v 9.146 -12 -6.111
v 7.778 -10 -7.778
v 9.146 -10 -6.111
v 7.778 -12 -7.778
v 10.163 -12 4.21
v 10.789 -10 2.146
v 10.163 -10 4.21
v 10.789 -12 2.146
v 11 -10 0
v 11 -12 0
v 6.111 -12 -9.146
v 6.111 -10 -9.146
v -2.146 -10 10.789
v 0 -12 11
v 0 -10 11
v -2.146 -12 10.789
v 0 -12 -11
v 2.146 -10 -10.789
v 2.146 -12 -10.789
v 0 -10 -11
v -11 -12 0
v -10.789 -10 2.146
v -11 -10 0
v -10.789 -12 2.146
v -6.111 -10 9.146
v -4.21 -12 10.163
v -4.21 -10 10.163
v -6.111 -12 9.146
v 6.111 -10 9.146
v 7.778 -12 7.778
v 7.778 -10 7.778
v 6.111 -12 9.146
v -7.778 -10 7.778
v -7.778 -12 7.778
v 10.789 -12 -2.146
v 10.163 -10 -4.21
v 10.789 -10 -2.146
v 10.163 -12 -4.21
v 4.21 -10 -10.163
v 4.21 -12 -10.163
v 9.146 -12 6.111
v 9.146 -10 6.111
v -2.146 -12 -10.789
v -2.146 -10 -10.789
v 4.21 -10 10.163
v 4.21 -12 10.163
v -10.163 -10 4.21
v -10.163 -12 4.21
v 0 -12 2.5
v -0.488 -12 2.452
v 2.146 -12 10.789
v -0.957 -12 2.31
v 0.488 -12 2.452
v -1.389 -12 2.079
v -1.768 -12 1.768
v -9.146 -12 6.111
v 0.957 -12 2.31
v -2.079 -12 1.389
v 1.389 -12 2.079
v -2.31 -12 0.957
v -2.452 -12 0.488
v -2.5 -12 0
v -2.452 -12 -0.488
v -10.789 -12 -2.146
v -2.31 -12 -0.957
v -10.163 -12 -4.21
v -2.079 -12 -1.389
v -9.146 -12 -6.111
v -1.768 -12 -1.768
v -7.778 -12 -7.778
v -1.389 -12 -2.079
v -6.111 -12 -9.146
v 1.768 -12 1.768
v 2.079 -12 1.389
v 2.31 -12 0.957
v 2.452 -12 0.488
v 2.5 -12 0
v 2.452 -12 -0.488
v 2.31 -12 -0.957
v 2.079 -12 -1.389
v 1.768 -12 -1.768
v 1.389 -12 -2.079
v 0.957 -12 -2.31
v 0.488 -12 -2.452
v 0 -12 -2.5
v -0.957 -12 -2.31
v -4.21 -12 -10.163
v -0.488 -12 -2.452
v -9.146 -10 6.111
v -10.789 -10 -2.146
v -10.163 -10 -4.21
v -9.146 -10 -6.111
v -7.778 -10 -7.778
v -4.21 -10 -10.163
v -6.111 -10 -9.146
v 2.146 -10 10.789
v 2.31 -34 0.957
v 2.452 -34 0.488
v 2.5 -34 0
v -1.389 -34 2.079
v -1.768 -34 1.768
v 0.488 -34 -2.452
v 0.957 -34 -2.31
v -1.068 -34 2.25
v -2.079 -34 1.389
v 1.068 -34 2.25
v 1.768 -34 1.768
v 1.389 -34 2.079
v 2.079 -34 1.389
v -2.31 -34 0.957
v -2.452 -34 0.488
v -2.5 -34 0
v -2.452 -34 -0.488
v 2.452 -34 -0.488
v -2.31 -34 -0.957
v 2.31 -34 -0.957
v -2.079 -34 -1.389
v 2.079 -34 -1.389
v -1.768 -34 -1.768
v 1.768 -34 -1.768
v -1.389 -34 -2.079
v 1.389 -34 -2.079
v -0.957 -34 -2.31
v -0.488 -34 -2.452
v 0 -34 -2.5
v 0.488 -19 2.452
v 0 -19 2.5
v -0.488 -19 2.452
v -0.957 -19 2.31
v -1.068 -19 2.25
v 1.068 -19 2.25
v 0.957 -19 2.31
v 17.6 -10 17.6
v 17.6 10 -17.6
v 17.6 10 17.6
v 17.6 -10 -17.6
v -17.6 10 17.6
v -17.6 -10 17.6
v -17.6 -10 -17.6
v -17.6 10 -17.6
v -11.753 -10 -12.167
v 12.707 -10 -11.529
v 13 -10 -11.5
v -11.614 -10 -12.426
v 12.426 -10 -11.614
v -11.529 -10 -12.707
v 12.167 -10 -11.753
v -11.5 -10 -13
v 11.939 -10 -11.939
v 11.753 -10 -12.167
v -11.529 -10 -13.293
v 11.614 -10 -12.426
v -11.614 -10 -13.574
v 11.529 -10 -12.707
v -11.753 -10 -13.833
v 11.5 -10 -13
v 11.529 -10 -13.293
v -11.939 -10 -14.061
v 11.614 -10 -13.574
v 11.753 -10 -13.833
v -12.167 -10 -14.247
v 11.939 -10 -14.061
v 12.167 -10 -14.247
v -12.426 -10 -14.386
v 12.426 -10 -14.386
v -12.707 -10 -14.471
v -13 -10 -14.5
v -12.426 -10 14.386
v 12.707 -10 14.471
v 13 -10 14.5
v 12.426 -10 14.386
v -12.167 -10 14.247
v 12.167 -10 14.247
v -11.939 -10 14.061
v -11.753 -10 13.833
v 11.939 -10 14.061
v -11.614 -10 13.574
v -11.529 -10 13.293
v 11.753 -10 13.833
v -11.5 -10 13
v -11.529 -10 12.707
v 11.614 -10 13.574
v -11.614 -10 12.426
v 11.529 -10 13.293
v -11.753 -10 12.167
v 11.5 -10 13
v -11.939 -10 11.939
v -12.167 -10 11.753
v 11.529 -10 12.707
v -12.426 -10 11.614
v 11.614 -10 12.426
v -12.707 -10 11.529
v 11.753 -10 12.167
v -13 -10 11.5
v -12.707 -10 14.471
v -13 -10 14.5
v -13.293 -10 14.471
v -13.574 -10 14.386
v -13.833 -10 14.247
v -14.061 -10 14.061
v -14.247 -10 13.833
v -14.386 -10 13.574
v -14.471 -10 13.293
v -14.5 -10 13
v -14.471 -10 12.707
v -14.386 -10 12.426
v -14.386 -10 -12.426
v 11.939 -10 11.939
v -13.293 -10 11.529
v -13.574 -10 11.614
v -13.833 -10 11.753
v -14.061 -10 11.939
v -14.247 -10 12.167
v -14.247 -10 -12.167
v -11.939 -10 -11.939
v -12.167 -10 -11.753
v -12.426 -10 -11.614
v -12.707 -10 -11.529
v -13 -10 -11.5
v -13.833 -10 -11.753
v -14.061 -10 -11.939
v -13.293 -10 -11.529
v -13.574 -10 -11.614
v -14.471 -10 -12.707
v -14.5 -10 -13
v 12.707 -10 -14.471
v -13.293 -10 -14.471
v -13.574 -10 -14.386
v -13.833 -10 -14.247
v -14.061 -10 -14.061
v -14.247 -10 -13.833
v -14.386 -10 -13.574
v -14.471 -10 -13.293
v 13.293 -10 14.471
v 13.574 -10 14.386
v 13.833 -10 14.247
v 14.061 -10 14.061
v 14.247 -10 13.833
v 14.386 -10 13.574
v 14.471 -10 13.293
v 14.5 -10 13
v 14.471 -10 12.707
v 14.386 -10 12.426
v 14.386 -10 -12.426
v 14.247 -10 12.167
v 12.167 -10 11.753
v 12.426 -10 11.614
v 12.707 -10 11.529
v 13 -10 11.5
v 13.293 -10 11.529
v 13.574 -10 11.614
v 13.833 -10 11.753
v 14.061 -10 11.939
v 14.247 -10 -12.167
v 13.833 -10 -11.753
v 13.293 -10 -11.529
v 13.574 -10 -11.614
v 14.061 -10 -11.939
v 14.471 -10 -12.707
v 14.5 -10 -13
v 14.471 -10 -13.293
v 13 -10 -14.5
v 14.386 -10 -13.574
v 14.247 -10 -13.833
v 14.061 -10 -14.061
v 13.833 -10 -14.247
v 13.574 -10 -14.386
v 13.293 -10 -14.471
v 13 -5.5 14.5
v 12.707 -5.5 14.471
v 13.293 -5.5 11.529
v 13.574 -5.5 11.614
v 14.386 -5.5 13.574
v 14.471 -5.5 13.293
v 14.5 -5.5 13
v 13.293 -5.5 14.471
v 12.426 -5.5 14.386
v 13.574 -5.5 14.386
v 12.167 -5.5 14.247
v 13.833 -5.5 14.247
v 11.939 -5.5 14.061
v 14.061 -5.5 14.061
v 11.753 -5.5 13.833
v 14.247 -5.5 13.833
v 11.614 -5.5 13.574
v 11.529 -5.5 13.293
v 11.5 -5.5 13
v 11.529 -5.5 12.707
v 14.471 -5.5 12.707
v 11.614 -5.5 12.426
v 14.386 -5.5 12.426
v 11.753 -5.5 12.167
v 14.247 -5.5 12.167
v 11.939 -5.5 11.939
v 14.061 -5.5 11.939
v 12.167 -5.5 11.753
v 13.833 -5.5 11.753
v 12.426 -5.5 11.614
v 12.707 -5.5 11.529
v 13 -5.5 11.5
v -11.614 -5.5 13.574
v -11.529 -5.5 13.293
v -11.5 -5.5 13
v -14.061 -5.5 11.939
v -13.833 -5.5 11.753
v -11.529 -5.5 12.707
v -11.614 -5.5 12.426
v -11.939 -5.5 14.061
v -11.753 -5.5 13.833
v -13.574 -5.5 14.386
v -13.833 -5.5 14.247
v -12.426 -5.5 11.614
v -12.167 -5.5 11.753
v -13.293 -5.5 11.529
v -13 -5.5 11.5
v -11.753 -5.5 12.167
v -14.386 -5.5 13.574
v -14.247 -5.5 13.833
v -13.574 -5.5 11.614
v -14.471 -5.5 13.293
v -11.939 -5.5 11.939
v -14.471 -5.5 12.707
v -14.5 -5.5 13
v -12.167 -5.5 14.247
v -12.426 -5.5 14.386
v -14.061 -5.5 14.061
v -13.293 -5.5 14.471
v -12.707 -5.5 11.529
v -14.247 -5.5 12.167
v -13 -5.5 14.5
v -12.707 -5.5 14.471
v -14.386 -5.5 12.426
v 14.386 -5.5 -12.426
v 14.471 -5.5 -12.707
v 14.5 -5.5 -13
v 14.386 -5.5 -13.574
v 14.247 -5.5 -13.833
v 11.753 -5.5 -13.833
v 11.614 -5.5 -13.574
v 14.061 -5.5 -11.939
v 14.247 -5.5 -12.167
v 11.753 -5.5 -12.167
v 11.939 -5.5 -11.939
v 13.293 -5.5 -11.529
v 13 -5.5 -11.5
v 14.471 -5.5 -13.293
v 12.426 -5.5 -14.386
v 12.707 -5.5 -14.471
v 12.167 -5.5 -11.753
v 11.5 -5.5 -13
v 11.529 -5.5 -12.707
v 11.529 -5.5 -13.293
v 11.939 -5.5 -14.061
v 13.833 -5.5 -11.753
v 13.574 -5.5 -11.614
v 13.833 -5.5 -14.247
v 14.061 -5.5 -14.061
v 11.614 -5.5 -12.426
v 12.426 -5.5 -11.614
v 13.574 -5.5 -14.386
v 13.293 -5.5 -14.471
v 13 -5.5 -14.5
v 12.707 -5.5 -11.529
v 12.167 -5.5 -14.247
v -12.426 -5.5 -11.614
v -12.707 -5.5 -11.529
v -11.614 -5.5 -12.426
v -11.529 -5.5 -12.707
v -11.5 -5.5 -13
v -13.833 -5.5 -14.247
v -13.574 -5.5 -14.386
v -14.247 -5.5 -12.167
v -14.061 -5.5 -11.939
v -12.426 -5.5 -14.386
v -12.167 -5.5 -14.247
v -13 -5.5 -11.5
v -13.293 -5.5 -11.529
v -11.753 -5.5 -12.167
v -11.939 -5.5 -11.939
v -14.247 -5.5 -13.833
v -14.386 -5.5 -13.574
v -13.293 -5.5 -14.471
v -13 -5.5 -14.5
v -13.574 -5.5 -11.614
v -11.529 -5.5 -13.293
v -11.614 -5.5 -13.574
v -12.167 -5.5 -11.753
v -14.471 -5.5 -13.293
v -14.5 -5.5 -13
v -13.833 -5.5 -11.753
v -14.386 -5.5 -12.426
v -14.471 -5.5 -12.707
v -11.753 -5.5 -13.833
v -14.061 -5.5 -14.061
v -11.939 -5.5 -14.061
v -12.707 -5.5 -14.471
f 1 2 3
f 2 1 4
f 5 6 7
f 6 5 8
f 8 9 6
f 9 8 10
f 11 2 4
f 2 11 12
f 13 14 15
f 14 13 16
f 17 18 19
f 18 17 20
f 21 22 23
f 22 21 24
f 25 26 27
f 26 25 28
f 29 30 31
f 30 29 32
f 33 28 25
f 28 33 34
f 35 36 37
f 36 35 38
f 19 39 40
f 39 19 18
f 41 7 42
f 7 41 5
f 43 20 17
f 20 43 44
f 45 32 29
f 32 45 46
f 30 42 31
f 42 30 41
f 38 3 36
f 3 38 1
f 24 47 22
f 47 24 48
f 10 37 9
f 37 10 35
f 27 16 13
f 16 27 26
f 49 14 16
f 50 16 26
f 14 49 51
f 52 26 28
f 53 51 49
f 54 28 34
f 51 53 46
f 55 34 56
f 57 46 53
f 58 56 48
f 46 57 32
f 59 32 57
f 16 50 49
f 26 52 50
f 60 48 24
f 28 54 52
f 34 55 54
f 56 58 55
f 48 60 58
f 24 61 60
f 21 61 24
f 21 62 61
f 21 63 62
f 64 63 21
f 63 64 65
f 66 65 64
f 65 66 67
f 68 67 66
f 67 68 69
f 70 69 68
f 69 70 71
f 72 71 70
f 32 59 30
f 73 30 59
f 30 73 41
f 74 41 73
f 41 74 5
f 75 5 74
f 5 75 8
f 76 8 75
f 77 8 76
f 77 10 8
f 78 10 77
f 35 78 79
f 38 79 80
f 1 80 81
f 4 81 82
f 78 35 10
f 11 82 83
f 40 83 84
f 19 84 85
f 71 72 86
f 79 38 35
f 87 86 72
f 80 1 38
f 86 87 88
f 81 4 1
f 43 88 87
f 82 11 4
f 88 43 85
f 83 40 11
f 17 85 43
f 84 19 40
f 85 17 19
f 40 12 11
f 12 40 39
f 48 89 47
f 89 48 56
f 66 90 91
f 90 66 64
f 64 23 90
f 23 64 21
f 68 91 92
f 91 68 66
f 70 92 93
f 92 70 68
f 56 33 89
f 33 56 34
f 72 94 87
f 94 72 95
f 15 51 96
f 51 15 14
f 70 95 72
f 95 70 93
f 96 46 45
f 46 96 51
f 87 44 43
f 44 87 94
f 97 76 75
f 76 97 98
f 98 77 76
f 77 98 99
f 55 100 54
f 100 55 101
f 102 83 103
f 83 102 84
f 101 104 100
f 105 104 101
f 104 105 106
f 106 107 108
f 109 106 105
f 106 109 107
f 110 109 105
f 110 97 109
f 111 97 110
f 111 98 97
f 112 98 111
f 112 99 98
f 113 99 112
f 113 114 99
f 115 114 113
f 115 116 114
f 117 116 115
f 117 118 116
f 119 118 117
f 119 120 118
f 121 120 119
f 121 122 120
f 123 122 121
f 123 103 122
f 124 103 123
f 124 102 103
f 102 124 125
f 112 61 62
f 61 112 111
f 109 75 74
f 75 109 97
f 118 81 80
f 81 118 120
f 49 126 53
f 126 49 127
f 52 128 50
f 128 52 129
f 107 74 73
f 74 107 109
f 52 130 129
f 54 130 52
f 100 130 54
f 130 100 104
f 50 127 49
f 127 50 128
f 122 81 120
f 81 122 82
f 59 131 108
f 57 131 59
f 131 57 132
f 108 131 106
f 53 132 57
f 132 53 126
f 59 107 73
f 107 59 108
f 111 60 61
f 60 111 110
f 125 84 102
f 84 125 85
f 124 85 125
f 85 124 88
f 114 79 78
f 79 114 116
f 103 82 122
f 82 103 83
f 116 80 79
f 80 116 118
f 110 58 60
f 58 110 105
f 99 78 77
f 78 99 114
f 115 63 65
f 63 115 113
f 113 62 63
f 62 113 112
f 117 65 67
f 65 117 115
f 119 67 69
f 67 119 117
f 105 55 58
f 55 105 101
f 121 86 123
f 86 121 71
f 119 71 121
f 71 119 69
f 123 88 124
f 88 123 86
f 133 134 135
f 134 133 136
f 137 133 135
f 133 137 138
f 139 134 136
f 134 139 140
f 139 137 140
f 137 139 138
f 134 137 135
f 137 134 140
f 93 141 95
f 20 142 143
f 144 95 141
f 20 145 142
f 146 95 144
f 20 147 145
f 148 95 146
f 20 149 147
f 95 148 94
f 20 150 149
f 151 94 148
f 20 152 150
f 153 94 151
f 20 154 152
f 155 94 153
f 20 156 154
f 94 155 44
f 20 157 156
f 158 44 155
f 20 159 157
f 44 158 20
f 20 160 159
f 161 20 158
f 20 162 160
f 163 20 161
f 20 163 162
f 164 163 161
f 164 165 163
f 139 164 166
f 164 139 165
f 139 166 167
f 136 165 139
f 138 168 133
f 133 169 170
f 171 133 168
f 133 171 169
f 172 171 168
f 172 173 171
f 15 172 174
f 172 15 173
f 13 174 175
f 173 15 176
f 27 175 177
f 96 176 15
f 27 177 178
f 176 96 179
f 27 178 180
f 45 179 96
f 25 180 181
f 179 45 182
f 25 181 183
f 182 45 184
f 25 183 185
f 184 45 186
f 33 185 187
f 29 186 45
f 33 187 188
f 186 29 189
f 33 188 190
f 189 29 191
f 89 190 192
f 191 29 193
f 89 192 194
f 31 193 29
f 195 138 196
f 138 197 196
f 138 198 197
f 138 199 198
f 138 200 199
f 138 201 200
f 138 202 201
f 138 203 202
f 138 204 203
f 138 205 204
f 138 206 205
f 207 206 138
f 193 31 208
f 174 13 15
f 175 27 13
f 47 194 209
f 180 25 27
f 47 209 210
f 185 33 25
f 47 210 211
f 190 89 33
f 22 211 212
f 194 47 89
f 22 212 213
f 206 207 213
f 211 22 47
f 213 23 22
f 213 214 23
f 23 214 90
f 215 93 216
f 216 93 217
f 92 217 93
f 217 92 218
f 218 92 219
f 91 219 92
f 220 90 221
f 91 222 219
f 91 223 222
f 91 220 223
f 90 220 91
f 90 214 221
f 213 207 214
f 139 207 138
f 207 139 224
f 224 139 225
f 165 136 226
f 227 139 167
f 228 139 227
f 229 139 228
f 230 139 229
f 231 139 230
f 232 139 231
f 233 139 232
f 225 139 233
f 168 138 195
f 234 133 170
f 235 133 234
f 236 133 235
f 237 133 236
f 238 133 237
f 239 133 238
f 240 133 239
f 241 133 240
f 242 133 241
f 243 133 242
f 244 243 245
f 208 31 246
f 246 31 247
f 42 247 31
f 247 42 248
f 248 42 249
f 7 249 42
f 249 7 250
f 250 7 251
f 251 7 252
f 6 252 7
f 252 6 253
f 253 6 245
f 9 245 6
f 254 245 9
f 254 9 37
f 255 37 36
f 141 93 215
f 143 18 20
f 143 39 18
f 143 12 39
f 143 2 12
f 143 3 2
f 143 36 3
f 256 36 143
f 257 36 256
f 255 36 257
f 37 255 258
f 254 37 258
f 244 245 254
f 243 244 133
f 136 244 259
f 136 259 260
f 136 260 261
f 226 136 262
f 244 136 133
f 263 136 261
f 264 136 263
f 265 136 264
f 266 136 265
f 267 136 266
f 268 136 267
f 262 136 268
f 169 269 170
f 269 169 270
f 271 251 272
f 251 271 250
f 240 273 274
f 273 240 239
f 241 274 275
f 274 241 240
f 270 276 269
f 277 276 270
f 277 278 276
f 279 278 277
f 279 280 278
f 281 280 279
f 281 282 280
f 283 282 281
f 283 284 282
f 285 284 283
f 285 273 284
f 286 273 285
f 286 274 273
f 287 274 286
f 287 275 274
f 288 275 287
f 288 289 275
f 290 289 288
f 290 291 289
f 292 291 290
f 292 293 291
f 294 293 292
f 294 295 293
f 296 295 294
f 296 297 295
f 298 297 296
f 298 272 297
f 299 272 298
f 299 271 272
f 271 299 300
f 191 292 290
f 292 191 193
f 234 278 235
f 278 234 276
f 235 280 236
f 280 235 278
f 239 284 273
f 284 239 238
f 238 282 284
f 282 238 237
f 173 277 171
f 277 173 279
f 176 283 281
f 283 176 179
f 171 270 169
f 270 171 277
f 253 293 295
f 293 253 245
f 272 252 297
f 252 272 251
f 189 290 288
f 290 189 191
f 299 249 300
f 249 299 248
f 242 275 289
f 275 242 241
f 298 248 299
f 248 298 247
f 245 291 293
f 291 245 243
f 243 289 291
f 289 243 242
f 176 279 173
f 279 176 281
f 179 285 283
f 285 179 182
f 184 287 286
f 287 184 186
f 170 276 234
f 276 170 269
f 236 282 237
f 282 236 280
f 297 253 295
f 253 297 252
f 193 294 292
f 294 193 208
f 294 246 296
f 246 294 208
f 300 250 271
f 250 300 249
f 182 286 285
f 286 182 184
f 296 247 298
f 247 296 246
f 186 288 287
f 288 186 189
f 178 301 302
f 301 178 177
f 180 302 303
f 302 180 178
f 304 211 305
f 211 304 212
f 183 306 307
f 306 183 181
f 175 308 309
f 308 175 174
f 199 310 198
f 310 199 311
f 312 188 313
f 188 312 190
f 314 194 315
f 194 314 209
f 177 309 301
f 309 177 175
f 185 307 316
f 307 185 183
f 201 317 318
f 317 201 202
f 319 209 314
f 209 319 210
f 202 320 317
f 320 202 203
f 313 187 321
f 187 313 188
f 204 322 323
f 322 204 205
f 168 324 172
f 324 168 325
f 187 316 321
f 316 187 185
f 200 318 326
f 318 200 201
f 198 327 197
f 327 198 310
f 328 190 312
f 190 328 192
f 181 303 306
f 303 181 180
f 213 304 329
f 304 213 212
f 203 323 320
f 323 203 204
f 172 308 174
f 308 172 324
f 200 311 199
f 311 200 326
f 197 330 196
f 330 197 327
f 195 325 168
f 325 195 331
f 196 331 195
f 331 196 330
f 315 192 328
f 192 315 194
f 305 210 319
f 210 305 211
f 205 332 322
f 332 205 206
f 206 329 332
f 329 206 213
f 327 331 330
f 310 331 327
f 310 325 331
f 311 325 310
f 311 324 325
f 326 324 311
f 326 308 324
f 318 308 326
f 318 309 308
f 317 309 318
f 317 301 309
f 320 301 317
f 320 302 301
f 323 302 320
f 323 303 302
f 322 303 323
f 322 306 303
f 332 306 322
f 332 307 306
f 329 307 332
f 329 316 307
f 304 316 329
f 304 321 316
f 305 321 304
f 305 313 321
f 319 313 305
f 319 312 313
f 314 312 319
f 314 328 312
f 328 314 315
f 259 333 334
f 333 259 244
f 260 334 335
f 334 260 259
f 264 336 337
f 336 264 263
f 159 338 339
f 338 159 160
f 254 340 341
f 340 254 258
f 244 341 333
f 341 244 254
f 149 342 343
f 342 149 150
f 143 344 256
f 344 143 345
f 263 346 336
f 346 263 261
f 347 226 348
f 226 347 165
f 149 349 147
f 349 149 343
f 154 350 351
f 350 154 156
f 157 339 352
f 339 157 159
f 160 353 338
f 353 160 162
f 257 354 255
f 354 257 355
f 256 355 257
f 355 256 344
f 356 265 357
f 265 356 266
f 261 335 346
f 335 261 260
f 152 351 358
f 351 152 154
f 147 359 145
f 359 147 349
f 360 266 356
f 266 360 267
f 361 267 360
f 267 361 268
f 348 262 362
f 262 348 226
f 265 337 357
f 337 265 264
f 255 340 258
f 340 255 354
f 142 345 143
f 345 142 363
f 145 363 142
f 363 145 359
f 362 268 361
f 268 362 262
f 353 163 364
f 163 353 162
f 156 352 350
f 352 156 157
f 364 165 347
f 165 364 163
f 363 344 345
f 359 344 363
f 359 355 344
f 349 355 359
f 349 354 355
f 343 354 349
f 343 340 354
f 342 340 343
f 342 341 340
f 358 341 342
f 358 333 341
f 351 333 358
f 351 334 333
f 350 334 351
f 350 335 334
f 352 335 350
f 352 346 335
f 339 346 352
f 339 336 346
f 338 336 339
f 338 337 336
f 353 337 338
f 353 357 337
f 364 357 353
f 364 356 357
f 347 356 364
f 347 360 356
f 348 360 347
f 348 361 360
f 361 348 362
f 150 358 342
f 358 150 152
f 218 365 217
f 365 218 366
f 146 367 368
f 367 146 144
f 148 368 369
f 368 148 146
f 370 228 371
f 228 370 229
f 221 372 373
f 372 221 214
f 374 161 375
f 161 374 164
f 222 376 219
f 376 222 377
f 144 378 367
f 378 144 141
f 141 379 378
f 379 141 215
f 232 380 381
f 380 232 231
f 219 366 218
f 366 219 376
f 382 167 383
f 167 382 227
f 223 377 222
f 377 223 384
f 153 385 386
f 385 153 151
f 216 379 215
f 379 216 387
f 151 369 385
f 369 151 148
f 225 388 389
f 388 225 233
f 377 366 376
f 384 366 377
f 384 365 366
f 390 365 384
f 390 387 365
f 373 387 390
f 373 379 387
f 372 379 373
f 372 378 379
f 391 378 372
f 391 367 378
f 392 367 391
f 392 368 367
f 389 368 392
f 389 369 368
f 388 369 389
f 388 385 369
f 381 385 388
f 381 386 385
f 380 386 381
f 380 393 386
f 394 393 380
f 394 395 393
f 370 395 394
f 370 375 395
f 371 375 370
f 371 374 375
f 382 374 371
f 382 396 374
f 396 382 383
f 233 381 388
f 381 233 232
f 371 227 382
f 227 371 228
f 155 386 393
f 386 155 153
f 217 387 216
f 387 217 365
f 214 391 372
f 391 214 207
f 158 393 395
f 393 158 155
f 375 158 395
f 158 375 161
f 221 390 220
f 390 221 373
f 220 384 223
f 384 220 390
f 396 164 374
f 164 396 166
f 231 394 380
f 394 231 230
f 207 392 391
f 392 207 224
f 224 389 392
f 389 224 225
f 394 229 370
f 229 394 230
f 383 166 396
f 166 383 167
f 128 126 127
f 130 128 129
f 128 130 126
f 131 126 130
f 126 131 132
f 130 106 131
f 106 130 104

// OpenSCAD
// WeePrusa
// Stepper Motors
// GNU GPL v3
// Thomas Phillips (tntexplosivesltd@gmail.com)
// https://github.com/tntexplosivesltd/WeePrusa

$fn = 32;

// Colours
black = [12/255, 12/255, 12/255];
grey = [200/255, 200/255, 200/255];

// Motor back
width = 35.2;
torque = 4;

// Shaft
shaft = 24;
shaft_radius = 2.5;
keyway = 15;
hub_radius = 11;
hub_width = 2;

// Screws
screw_size = 3;
screw_depth = 4.5;
screw_separation = 26;

function get_length(t) = lookup(t, [
			[4, 20],
			[6.5, 26],
			[7, 28],
			[12.5, 28],
			[10, 26],
			[14, 26],
			[18, 34],
			[18.5, 41],
			[23, 42],
			[40, 52],
	]);

length = get_length(torque);

difference()
{
	union()
	{
		color (black) cube ([width, length, width], center = true);
		color (grey)
		{
			translate ([0, -length/2, 0]) rotate ([90,0,0]) cylinder (h = hub_width*2, r1 = hub_radius, r2 = hub_radius, center = true);
			translate ([0, -length/2, 0]) rotate ([90,0,0]) cylinder (h = shaft*2, r1 = shaft_radius, r2 = shaft_radius, center = true);
		}
	}
	
	color (grey)
	{
		// screw holes
		translate ([screw_separation/2, -length/2, screw_separation/2]) rotate ([90,0,0]) cylinder (h = screw_depth*2, r1 = screw_size/2, r2 = screw_size/2, center = true);
		translate ([-screw_separation/2, -length/2, screw_separation/2]) rotate ([90,0,0]) cylinder (h = screw_depth*2, r1 = screw_size/2, r2 = screw_size/2, center = true);
		translate ([screw_separation/2, -length/2, -screw_separation/2]) rotate ([90,0,0]) cylinder (h = screw_depth*2, r1 = screw_size/2, r2 = screw_size/2, center = true);
		translate ([-screw_separation/2, -length/2, -screw_separation/2]) rotate ([90,0,0]) cylinder (h = screw_depth*2, r1 = screw_size/2, r2 = screw_size/2, center = true);

		// flat on shaft
		translate ([0, -length/2 - shaft, shaft_radius]) rotate ([90,0,0]) cube ([5, 0.5, keyway*2], center = true);
	}
	color (black) translate ([0, length, 0]) rotate ([90,0,0]) cube ([width, width, length], center = true);
}
